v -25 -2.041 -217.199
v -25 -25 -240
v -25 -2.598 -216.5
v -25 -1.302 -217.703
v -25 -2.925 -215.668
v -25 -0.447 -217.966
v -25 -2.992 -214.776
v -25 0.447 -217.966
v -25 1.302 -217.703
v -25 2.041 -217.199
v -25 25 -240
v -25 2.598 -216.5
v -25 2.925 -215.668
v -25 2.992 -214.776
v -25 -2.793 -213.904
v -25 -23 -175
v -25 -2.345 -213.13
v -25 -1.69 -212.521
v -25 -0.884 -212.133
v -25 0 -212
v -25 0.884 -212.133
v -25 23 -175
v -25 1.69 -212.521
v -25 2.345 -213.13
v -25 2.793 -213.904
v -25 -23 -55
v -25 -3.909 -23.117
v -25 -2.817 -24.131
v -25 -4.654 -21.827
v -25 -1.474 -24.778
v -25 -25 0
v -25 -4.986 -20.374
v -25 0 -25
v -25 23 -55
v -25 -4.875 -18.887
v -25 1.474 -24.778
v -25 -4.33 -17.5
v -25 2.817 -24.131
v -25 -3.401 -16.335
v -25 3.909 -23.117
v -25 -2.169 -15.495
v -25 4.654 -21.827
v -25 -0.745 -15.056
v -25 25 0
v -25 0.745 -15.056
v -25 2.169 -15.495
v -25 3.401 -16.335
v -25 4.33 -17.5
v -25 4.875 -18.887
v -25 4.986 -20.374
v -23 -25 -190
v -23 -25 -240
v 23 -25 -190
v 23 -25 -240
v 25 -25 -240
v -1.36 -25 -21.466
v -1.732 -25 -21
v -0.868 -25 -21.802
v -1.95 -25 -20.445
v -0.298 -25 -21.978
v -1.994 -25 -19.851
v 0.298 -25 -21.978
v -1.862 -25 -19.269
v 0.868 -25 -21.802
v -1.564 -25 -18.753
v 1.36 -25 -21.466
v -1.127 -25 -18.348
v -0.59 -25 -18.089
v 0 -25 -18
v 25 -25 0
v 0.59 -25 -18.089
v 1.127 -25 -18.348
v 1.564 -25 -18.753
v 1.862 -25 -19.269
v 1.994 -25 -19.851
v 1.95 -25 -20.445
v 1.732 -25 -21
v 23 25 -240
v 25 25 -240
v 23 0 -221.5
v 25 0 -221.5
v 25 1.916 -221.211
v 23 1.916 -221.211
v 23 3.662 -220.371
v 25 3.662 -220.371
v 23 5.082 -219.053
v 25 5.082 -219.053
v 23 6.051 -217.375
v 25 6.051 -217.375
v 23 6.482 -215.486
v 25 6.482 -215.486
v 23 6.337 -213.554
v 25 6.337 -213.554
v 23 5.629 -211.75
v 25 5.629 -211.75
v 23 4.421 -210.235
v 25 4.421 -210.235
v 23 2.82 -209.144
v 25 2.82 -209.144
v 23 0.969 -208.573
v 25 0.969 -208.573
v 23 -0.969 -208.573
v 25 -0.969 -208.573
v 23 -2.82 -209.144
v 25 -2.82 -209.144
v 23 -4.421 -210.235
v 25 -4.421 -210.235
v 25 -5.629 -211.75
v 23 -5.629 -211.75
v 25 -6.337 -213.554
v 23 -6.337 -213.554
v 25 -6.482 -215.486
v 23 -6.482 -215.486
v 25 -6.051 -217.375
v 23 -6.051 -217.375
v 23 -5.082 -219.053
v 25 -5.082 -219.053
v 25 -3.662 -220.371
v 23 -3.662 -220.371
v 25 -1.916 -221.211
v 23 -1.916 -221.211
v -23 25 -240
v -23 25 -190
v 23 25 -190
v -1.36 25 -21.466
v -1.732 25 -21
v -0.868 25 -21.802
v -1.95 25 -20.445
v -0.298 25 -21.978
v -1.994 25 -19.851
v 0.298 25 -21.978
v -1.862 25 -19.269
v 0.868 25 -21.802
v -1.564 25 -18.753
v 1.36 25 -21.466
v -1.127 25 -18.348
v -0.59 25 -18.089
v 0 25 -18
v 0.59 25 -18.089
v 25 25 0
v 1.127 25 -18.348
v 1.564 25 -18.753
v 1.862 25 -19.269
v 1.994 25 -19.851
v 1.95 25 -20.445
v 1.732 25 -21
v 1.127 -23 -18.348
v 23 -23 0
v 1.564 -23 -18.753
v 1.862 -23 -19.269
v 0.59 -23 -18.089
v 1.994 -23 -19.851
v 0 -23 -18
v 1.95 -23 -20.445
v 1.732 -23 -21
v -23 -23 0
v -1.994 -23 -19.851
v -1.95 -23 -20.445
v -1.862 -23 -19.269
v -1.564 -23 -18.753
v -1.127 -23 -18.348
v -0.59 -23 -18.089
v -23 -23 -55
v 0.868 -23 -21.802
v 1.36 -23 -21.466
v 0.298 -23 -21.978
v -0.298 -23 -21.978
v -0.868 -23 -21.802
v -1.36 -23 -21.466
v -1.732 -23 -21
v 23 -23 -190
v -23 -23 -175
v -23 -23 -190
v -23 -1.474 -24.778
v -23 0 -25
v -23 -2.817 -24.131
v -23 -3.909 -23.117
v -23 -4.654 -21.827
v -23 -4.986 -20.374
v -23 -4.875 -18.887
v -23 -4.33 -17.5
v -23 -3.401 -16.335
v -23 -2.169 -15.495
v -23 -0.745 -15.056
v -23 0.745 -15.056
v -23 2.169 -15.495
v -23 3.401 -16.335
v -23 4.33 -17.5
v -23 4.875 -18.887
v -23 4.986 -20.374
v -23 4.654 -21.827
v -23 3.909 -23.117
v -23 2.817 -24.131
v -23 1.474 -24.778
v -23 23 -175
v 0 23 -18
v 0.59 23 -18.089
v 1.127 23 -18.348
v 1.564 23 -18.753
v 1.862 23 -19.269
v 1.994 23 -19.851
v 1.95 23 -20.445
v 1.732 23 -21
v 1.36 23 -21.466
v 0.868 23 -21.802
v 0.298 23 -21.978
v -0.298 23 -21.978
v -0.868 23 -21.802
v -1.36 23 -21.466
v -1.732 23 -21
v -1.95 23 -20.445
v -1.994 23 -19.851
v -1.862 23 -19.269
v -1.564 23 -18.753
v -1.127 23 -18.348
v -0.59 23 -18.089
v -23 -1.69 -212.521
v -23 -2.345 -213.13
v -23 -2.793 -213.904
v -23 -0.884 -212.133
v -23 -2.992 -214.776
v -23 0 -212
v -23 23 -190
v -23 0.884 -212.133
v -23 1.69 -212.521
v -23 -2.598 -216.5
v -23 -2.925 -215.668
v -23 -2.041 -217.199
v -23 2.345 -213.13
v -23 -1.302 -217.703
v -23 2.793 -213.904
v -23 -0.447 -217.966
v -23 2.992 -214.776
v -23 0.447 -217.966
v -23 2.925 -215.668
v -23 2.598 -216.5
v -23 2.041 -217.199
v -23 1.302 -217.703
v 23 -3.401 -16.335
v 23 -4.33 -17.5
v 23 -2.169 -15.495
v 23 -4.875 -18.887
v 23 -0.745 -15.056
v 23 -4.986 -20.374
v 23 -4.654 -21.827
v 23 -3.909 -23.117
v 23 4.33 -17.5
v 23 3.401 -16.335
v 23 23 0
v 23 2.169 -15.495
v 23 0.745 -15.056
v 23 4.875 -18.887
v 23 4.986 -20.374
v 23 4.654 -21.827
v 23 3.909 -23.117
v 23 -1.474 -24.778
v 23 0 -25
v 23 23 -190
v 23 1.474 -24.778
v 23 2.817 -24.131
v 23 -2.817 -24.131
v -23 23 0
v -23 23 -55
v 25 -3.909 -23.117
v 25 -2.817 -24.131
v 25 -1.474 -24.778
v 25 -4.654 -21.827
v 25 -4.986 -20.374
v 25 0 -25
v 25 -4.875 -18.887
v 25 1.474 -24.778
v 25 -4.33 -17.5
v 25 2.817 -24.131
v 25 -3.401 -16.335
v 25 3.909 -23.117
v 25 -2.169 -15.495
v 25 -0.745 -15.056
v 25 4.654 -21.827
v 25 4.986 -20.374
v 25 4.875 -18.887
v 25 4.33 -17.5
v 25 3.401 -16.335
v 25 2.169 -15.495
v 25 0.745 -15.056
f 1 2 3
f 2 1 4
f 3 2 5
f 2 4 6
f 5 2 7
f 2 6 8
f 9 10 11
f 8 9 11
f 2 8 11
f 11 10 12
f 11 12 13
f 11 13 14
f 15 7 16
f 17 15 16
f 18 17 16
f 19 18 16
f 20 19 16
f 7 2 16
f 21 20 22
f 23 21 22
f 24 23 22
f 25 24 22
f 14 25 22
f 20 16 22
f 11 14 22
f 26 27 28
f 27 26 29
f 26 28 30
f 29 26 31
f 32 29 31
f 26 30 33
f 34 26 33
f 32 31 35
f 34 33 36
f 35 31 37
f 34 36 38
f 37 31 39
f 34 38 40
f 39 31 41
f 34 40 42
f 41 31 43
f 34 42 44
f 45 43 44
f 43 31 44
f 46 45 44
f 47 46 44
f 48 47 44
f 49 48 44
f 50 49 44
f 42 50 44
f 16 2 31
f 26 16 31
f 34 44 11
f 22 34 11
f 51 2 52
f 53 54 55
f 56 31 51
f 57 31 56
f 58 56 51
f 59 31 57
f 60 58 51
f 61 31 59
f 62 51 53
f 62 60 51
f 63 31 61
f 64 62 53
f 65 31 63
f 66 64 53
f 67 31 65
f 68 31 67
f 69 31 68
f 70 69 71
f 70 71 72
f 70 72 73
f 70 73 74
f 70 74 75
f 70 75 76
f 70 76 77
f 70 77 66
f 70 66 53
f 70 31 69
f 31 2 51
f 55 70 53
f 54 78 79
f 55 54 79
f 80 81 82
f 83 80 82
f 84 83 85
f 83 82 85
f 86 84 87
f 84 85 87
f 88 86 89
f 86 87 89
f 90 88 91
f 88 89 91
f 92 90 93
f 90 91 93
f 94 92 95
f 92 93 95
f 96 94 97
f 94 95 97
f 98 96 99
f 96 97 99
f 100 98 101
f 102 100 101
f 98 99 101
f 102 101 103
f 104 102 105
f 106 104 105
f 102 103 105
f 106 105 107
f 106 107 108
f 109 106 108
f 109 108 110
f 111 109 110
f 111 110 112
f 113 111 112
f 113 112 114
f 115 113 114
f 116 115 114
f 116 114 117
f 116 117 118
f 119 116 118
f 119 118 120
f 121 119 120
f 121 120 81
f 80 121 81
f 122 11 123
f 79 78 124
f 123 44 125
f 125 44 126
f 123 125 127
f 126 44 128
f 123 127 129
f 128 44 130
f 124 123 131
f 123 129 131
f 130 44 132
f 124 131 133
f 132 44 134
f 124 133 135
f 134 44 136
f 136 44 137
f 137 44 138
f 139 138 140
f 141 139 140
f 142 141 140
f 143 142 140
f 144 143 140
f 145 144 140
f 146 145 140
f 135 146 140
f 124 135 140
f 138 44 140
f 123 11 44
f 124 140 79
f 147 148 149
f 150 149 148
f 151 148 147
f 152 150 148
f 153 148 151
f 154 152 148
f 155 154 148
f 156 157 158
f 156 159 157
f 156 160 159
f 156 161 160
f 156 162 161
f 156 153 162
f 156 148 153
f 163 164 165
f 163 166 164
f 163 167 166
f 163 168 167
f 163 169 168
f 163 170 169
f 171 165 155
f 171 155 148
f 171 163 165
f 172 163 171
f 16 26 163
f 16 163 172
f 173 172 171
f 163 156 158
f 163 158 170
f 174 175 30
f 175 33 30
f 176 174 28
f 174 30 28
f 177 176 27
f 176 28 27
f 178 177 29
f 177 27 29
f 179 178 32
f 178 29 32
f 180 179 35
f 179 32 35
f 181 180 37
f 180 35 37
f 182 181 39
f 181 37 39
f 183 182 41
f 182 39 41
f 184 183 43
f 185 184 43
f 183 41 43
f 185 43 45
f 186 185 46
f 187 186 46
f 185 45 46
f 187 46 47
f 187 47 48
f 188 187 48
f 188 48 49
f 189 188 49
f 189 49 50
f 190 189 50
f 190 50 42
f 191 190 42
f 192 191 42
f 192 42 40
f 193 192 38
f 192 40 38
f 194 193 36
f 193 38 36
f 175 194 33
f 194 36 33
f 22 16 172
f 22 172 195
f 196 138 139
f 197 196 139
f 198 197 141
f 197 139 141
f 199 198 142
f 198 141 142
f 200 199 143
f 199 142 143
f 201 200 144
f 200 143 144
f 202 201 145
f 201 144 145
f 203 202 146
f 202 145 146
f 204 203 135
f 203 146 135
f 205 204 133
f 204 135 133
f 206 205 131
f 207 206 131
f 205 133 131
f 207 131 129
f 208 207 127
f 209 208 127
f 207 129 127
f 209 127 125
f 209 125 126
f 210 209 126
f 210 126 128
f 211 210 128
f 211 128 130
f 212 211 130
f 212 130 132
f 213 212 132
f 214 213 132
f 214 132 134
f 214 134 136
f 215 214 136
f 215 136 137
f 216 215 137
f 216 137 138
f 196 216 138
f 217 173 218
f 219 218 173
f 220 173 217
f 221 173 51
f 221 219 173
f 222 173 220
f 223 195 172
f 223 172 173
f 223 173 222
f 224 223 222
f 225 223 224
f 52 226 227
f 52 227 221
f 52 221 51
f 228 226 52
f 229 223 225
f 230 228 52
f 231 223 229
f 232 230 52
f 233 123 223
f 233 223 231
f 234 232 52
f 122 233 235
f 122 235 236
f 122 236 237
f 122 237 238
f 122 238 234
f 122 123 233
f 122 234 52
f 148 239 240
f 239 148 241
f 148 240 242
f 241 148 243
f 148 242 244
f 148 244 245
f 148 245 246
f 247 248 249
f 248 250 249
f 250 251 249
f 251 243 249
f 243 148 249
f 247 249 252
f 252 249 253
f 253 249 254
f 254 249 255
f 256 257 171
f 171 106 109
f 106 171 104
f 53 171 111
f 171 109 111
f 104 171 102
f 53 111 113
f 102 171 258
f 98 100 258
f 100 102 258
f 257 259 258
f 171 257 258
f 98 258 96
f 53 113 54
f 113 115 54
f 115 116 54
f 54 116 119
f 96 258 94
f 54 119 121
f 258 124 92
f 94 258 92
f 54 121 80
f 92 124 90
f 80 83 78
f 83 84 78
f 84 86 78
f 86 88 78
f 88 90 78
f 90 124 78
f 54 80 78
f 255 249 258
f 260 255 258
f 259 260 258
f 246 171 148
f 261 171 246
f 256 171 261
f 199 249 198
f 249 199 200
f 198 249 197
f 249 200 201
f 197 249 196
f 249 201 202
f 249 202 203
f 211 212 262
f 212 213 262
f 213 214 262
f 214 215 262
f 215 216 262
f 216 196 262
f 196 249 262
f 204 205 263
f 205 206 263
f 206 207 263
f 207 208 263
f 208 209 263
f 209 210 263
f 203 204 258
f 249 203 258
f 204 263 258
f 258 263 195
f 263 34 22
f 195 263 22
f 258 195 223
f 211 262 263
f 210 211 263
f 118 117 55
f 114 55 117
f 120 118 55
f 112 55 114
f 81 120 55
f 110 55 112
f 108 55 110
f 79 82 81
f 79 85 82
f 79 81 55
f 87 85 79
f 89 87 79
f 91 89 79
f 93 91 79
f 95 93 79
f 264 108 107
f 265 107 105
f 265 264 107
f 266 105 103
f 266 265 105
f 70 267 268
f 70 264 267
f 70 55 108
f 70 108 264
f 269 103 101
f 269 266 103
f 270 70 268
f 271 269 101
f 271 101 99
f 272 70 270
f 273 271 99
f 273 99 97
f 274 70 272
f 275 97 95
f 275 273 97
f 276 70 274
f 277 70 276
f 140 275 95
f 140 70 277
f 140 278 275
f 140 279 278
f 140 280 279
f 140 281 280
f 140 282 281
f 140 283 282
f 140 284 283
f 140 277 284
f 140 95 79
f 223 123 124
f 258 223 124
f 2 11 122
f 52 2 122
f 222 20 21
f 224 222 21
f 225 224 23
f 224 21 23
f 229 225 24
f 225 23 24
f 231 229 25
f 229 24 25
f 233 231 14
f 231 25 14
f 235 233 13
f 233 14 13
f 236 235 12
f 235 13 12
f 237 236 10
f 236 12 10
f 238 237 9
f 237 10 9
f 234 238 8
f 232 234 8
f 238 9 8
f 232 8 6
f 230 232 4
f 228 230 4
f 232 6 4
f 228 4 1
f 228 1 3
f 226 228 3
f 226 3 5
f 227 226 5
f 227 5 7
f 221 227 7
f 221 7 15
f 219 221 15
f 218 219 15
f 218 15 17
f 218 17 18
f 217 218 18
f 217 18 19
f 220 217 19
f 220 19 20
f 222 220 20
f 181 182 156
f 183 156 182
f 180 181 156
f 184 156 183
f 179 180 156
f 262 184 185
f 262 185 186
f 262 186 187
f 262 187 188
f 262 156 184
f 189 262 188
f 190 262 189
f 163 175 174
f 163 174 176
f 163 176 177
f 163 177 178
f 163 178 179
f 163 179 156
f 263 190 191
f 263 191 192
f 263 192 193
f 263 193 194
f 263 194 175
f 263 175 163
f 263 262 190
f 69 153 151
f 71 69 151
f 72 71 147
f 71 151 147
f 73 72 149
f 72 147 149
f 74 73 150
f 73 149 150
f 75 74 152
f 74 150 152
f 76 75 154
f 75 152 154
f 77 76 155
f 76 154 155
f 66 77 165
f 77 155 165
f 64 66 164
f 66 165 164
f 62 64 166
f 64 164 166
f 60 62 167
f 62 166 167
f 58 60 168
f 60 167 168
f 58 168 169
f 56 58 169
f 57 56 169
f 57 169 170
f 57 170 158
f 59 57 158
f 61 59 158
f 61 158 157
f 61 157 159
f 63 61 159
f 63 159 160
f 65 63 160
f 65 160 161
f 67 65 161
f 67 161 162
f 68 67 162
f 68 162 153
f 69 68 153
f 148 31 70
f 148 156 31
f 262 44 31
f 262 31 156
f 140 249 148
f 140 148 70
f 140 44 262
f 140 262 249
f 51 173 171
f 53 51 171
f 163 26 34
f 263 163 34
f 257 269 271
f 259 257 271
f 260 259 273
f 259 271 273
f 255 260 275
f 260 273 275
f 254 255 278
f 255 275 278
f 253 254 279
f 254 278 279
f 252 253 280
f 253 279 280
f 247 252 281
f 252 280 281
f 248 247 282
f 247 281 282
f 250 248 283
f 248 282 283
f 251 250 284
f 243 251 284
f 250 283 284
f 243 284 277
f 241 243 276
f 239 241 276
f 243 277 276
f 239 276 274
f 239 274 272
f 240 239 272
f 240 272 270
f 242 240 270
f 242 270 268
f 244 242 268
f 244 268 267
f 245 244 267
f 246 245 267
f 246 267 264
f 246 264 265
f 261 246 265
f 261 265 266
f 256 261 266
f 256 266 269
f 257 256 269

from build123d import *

# Parameters (mm, degrees)
SKETCH1_W           = 50
SKETCH1_H           = 50
SKETCH1_W_2         = 46
SKETCH1_H_2         = 46
BOSS_EXTRUDE1_DEPTH = 240
SKETCH2_W           = 46
SKETCH2_H           = 50
CUT_EXTRUDE1_DEPTH  = 247.424430607
CUT_EXTRUDE2_REACH  = 248.424
SKETCH3_R           = 6.5
SKETCH3_R_2         = 5
CUT_EXTRUDE3_REACH  = 248.424
SKETCH4_R           = 3
SKETCH4_R_2         = 5
SKETCH5_W           = 120
SKETCH5_H           = 46
CUT_EXTRUDE5_DEPTH  = 48
SKETCH6_R           = 2
CUT_EXTRUDE6_DEPTH  = 247.424430607


with BuildPart() as part:
    # Sketch1 → Boss-Extrude1 (new body)
    with BuildSketch(Plane.XY):
        Rectangle(SKETCH1_W, SKETCH1_H)
        Rectangle(SKETCH1_W_2, SKETCH1_H_2, mode=Mode.SUBTRACT)
    extrude(amount=-BOSS_EXTRUDE1_DEPTH)

    # Sketch2 → Cut-Extrude1 (cut, through all)
    with BuildSketch(Plane(origin=(0, 25, 0), x_dir=(1, 0, 0), z_dir=(0, 1, 0))):
        with Locations((0, 215)):
            Rectangle(SKETCH2_W, SKETCH2_H)
    extrude(amount=-CUT_EXTRUDE1_DEPTH, mode=Mode.SUBTRACT)

    # Sketch3 → Cut-Extrude2 (cut, up to next)
    with BuildSketch(Plane(origin=(25, 0, 0), x_dir=(0, 0, -1), z_dir=(1, 0, 0)), mode=Mode.PRIVATE) as cut_extrude2_sk1:
        with Locations((215, 0)):
            Circle(SKETCH3_R)
    cut_extrude2_tool1 = extrude(cut_extrude2_sk1.sketch, amount=-CUT_EXTRUDE2_REACH, mode=Mode.PRIVATE) & part.part
    # Sketch3 → Cut-Extrude2 (cut, up to next)
    with BuildSketch(Plane(origin=(25, 0, 0), x_dir=(0, 0, -1), z_dir=(1, 0, 0)), mode=Mode.PRIVATE) as cut_extrude2_sk2:
        with Locations((20, 0)):
            Circle(SKETCH3_R_2)
    cut_extrude2_tool2 = extrude(cut_extrude2_sk2.sketch, amount=-CUT_EXTRUDE2_REACH, mode=Mode.PRIVATE) & part.part
    add(cut_extrude2_tool1.solids().sort_by_distance((25, 0, -215))[0], mode=Mode.SUBTRACT)
    add(cut_extrude2_tool2.solids().sort_by_distance((25, 0, -20))[0], mode=Mode.SUBTRACT)

    # Sketch4 → Cut-Extrude3 (cut, up to next)
    with BuildSketch(Plane.ZY.offset(25), mode=Mode.PRIVATE) as cut_extrude3_sk1:
        with Locations((-215, 0)):
            Circle(SKETCH4_R)
    cut_extrude3_tool1 = extrude(cut_extrude3_sk1.sketch, amount=-CUT_EXTRUDE3_REACH, mode=Mode.PRIVATE) & part.part
    # Sketch4 → Cut-Extrude3 (cut, up to next)
    with BuildSketch(Plane.ZY.offset(25), mode=Mode.PRIVATE) as cut_extrude3_sk2:
        with Locations(Location((-20, 0, 0), (0, 0, 180))):
            Circle(SKETCH4_R_2)
    cut_extrude3_tool2 = extrude(cut_extrude3_sk2.sketch, amount=-CUT_EXTRUDE3_REACH, mode=Mode.PRIVATE) & part.part
    add(cut_extrude3_tool1.solids().sort_by_distance((-25, 0, -215))[0], mode=Mode.SUBTRACT)
    add(cut_extrude3_tool2.solids().sort_by_distance((-25, 0, -20))[0], mode=Mode.SUBTRACT)

    # Sketch5 → Cut-Extrude5 (cut)
    with BuildSketch(Plane(origin=(-25, 0, 0), x_dir=(0, 0, -1), z_dir=(1, 0, 0))):
        with Locations((115, 0)):
            Rectangle(SKETCH5_W, SKETCH5_H)
    extrude(amount=CUT_EXTRUDE5_DEPTH, mode=Mode.SUBTRACT)

    # Sketch6 → Cut-Extrude6 (cut, through all)
    with BuildSketch(Plane(origin=(0, 25, 0), x_dir=(1, 0, 0), z_dir=(0, 1, 0))):
        with Locations(Location((0, 20, 0), (0, 0, 270))):
            Circle(SKETCH6_R)
    extrude(amount=-CUT_EXTRUDE6_DEPTH, mode=Mode.SUBTRACT)


solid = part.part
